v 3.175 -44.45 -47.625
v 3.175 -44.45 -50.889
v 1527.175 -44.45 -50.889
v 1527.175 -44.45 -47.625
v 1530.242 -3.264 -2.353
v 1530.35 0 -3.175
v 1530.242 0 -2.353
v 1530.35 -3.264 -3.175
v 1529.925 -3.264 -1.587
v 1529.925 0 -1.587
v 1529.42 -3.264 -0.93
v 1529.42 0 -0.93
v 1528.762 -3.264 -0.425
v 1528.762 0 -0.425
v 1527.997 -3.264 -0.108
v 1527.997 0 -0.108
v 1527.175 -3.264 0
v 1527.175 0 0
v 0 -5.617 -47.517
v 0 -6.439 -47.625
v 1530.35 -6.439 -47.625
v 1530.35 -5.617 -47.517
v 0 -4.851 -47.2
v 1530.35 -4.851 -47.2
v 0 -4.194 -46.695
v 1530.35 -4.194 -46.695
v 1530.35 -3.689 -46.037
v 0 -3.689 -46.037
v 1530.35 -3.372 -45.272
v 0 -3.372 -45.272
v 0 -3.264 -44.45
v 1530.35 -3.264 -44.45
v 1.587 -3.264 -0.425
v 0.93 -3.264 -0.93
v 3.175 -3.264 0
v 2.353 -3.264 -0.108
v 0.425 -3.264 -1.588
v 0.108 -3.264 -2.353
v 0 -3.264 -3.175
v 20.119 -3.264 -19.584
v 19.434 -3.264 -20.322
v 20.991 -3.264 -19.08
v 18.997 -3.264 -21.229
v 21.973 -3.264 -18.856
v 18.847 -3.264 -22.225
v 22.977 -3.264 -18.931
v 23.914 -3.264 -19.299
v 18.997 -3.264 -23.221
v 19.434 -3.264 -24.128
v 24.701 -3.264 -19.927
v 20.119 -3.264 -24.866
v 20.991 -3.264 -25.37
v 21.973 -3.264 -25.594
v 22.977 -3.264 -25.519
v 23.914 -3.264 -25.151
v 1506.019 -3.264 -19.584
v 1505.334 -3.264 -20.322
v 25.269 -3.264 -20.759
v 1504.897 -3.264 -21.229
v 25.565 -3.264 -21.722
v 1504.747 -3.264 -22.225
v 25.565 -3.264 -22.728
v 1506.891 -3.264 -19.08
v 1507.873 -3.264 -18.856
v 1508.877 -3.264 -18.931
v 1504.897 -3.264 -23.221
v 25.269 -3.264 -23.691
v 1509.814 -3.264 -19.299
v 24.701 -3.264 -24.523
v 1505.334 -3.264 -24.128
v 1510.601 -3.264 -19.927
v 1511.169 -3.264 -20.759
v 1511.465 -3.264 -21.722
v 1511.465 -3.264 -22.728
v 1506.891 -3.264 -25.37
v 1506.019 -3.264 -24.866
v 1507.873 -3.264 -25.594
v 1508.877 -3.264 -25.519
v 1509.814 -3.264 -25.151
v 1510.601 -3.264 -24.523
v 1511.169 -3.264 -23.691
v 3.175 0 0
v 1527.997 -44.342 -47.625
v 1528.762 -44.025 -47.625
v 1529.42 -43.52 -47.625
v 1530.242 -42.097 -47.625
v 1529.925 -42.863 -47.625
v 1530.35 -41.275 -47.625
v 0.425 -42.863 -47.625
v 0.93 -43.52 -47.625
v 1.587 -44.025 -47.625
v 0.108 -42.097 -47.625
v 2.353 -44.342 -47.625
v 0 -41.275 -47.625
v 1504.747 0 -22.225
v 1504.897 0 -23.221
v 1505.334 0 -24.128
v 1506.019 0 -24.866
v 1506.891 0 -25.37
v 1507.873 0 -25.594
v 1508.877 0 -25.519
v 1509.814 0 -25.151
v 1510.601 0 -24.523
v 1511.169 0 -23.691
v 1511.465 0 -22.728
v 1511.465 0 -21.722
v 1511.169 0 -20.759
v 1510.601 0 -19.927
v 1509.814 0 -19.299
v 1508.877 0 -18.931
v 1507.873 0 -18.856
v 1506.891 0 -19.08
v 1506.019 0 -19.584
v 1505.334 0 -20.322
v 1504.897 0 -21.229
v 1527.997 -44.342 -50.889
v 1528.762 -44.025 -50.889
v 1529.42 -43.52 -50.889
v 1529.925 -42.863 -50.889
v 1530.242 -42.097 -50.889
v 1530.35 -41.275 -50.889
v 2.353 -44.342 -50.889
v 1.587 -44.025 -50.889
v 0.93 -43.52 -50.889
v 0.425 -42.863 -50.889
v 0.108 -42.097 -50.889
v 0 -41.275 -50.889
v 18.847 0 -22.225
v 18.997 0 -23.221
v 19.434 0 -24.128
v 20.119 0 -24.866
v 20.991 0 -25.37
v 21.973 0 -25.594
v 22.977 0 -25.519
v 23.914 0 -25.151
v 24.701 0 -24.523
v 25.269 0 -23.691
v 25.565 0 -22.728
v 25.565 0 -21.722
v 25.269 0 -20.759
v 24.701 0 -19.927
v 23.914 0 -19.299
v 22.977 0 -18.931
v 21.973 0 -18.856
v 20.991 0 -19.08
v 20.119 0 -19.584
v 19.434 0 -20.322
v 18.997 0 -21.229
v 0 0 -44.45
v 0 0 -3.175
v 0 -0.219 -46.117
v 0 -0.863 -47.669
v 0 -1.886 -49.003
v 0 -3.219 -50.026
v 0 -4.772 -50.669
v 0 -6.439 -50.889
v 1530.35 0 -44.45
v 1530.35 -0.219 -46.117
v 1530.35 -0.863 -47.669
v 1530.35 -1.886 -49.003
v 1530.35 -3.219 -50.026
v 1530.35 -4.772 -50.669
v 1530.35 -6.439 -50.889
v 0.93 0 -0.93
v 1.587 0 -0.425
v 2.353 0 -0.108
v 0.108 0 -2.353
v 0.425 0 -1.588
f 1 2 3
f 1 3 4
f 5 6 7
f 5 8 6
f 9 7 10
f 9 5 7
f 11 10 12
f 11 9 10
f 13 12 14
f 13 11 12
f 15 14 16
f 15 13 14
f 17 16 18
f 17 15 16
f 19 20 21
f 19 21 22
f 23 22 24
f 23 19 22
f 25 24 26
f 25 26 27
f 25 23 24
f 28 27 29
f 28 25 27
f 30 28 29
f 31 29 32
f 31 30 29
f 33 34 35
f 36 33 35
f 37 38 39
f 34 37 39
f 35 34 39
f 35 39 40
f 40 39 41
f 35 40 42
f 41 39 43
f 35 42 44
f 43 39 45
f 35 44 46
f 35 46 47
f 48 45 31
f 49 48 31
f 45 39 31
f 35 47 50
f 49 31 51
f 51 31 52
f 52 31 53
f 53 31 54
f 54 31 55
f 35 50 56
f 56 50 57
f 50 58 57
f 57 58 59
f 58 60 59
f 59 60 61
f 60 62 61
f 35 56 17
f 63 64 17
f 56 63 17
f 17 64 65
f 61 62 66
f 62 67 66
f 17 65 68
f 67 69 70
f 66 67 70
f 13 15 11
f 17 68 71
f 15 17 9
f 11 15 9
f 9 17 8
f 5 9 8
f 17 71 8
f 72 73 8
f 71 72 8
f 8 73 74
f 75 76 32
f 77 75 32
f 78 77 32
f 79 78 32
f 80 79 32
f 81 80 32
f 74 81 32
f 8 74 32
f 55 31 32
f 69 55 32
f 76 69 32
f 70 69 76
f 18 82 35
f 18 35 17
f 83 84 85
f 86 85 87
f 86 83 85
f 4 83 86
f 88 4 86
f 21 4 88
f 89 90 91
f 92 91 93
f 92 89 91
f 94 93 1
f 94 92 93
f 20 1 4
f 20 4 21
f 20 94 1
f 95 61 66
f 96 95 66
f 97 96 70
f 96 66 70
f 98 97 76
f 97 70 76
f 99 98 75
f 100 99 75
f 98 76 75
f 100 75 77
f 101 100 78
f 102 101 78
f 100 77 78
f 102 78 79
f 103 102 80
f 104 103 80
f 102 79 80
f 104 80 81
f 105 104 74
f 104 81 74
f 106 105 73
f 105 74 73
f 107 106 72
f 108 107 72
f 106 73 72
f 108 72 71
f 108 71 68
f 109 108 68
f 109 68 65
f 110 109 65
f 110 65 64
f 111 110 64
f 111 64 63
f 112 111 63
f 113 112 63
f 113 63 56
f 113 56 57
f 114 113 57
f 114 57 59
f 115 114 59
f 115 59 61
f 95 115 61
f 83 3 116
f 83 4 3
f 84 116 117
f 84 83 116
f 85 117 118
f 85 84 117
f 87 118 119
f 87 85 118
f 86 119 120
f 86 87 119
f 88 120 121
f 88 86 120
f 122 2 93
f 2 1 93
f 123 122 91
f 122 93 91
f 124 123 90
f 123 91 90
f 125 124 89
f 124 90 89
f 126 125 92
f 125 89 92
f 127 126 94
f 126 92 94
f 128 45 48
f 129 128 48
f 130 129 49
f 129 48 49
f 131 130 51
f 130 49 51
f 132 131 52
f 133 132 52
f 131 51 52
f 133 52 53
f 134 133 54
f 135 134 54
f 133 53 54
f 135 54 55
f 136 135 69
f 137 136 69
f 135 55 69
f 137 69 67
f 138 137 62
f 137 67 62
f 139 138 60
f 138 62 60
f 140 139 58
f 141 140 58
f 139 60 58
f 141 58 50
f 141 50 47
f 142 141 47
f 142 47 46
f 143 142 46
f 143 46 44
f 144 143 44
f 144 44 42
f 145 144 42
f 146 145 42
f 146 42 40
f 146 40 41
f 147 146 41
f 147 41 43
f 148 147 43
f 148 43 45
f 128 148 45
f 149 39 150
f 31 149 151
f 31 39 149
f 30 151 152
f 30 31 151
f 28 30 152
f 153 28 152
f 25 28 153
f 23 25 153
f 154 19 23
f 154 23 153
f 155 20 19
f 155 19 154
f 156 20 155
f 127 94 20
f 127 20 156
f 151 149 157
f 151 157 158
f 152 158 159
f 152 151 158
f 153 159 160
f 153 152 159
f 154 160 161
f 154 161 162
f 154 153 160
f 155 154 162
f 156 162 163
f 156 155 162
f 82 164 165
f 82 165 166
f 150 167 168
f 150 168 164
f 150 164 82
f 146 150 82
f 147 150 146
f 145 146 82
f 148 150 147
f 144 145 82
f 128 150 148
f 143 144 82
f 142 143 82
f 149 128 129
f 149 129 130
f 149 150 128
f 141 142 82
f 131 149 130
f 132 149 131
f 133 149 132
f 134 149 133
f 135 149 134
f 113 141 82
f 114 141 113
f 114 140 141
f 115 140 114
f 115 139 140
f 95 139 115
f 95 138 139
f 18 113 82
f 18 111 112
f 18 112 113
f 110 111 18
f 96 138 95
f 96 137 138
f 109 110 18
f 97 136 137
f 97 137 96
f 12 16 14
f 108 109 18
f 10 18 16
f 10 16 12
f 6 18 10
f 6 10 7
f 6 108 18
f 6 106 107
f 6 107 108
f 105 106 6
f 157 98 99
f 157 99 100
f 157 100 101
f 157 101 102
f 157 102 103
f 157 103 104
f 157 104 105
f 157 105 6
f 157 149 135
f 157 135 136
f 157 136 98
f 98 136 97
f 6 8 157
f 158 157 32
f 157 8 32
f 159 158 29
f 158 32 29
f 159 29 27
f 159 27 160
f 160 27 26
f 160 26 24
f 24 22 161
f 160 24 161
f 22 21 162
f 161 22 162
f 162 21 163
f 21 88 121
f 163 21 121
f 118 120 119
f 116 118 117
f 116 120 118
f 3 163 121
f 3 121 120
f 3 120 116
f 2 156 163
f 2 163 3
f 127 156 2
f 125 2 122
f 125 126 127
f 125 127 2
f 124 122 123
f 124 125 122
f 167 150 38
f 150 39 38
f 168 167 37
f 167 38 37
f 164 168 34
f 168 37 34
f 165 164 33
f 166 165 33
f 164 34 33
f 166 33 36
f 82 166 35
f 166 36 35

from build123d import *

# Parameters (mm, degrees)
SKETCH3_W               = 1530.35
SKETCH3_H               = 44.45
BASE_FLANGE1_DEPTH      = 3.2639
EDGE_FLANGE1_DEPTH      = 1530.35
F_1_4_CLEARANCE_HOLE1_D = 6.7564
FILLET1_R               = 3.175


# Sheet-metal steps are written as plain solids
with BuildPart() as part:
    # Sketch3 → Base-Flange1 (new body)
    with BuildSketch(Plane(origin=(0, 0, 0), x_dir=(1, 0, 0), z_dir=(0, 1, 0))):
        with Locations((765.175, 22.225)):
            Rectangle(SKETCH3_W, SKETCH3_H)
    extrude(amount=-BASE_FLANGE1_DEPTH)

    # Edge-Flange1 section (across the edge) → Edge-Flange1 (add)
    with BuildSketch(Plane(origin=(0, -3.2639, -47.625), x_dir=(0, 0, 1), z_dir=(1, 0, 0))):
        with BuildLine():
            Line((-3.2639, 3.175), (-3.2639, 41.1861))
            Line((-3.2639, 41.1861), (0, 41.1861))
            Line((0, 41.1861), (0, 3.175))
            ThreePointArc((0, 3.175), (0.92993597, 0.92993597), (3.175, 0))
            Line((3.175, 0), (3.175, -3.2639))
            ThreePointArc((3.175, -3.2639), (-1.377989853, -1.377989853), (-3.2639, 3.175))
        make_face()
    extrude(amount=EDGE_FLANGE1_DEPTH)

    # 1/4 Clearance Hole1 (through all)
    with Locations(Plane(origin=(0, 0, 0), x_dir=(1, 0, 0), z_dir=(0, 1, 0))):
        with Locations((22.225, 22.225), (1508.125, 22.225)):
            Hole(F_1_4_CLEARANCE_HOLE1_D / 2)

    # Fillet1
    fillet1_edges = [part.edges().sort_by_distance(p)[0] for p in [
        (0, -44.45, -49.25695),
        (1530.35, -44.45, -49.25695),
        (1530.35, -1.63195, 0),
        (0, -1.63195, 0),
    ]]
    fillet(fillet1_edges, radius=FILLET1_R)


solid = part.part
